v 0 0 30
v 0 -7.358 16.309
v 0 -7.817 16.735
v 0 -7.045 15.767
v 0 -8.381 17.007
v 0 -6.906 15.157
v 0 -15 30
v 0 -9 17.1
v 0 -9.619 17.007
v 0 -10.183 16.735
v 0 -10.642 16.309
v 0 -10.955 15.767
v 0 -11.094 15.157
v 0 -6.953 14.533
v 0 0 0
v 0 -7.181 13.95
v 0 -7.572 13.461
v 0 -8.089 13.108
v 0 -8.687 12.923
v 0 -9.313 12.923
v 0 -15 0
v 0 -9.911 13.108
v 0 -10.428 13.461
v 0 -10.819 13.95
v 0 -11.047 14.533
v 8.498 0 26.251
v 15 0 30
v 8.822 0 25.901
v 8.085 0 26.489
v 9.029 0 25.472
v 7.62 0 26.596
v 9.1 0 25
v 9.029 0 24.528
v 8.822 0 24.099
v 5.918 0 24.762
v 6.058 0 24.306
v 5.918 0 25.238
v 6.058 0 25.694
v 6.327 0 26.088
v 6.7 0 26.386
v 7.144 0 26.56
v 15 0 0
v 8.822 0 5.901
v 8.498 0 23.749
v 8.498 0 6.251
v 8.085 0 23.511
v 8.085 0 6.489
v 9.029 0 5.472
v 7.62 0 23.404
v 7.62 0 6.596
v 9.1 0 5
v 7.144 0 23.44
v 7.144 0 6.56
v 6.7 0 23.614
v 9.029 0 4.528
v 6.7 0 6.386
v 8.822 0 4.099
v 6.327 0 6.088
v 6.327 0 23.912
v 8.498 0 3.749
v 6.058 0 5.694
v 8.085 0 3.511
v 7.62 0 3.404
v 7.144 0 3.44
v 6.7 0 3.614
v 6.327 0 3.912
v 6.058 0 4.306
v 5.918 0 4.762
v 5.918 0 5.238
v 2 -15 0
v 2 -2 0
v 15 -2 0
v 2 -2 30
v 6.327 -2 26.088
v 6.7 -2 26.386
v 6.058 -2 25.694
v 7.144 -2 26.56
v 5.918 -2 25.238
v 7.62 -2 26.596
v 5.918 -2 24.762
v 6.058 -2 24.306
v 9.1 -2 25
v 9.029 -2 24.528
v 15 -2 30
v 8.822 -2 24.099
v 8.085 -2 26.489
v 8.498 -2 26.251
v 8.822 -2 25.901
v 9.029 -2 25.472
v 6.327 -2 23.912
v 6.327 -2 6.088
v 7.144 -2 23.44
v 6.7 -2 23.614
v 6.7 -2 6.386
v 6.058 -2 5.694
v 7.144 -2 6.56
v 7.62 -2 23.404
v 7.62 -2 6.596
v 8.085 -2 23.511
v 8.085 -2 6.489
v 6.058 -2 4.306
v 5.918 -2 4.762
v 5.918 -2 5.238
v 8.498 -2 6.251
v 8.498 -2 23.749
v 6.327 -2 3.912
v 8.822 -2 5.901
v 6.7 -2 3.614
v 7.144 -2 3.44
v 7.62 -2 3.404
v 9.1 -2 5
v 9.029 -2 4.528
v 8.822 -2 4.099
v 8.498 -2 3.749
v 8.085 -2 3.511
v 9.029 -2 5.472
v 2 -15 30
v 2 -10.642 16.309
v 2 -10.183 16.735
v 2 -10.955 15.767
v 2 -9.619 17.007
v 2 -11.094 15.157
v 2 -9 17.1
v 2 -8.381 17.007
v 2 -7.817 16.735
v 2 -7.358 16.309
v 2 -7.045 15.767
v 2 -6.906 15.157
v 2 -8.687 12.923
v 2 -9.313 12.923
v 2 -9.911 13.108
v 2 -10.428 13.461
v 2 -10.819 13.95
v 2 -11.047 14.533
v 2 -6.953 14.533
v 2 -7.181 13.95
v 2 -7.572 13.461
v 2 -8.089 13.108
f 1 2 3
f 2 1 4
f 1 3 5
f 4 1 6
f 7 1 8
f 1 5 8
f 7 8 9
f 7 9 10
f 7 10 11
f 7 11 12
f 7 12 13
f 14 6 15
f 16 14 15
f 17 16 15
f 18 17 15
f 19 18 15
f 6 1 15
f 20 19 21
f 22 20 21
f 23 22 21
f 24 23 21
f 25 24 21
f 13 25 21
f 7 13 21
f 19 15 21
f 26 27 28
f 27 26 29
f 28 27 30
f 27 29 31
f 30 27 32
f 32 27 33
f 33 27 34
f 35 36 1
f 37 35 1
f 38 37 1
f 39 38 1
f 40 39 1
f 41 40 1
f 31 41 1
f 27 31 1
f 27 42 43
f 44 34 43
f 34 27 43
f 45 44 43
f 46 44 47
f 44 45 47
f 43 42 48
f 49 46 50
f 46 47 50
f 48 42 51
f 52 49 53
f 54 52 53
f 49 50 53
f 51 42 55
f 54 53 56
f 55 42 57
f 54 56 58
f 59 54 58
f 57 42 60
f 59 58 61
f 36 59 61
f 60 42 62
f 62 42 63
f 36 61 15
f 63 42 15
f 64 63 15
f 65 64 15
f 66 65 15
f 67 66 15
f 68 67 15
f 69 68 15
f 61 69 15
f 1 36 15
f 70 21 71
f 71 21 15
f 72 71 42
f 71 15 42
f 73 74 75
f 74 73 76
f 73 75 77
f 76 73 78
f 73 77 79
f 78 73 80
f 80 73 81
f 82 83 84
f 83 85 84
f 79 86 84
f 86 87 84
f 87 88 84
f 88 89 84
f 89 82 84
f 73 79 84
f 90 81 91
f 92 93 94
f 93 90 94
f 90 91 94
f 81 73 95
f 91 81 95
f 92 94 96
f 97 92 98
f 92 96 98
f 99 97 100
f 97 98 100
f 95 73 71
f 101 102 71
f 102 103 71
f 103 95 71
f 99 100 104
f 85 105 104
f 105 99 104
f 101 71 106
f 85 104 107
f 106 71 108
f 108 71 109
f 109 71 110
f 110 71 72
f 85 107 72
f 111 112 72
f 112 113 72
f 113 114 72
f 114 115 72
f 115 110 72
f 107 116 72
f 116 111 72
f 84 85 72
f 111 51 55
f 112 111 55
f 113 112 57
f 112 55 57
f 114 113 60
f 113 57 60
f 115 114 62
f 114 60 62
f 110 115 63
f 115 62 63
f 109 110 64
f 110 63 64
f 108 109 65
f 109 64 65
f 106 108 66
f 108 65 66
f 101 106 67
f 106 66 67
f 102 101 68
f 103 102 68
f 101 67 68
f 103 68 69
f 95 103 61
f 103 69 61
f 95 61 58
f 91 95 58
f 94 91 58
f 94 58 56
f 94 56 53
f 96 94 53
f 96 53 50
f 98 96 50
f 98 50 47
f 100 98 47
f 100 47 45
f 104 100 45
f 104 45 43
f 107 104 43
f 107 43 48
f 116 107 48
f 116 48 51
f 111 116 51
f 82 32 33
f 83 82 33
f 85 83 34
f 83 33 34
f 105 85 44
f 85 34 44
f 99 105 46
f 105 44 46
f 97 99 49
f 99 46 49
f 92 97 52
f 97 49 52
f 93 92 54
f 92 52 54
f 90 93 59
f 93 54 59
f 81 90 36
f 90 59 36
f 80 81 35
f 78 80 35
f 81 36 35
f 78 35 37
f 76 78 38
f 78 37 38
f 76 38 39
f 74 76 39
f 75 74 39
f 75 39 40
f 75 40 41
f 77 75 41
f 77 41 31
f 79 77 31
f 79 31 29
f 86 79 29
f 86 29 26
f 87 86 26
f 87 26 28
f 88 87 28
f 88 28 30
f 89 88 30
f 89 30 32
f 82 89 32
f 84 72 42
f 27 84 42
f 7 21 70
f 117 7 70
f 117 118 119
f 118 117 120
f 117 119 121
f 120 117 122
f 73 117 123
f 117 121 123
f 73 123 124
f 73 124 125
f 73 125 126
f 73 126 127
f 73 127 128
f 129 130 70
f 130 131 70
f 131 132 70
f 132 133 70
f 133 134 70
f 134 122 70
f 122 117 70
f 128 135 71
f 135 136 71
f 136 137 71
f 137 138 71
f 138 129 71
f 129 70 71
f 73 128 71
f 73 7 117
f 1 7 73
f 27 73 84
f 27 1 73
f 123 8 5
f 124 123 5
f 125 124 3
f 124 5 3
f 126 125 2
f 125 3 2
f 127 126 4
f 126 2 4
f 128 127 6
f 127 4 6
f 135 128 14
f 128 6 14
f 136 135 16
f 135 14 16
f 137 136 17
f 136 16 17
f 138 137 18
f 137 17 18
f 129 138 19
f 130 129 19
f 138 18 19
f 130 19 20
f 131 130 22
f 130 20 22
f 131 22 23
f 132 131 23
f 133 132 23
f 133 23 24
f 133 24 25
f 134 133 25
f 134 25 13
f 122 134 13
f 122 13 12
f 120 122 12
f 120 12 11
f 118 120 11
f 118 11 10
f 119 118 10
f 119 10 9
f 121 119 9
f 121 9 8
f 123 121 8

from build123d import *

# Parameters (mm, degrees)
EXTRUDE_1_DEPTH     = 30
SKETCH_2_R          = 1.6
CUT_EXTRUDE_1_DEPTH = 30
SKETCH_3_R          = 2.1
CUT_EXTRUDE_2_DEPTH = 30


with BuildPart() as part:
    # ｽｹｯﾁ1 → ﾎﾞｽ - 押し出し1 (new body)
    with BuildSketch(Plane.XY):
        Polygon((0, 0), (0, -15), (2, -15), (2, -2), (15, -2), (15, 0), align=None)
    extrude(amount=EXTRUDE_1_DEPTH)

    # ｽｹｯﾁ2 → ｶｯﾄ - 押し出し1 (cut)
    with BuildSketch(Plane(origin=(0, 0, 0), x_dir=(1, 0, 0), z_dir=(0, 1, 0))):
        with Locations((7.5, -5)):
            Circle(SKETCH_2_R)
        with Locations((7.5, -25)):
            Circle(SKETCH_2_R)
    extrude(amount=-CUT_EXTRUDE_1_DEPTH, mode=Mode.SUBTRACT)

    # ｽｹｯﾁ3 → ｶｯﾄ - 押し出し2 (cut)
    with BuildSketch(Plane.ZY):
        with Locations((15, -9)):
            Circle(SKETCH_3_R)
    extrude(amount=-CUT_EXTRUDE_2_DEPTH, mode=Mode.SUBTRACT)


solid = part.part
